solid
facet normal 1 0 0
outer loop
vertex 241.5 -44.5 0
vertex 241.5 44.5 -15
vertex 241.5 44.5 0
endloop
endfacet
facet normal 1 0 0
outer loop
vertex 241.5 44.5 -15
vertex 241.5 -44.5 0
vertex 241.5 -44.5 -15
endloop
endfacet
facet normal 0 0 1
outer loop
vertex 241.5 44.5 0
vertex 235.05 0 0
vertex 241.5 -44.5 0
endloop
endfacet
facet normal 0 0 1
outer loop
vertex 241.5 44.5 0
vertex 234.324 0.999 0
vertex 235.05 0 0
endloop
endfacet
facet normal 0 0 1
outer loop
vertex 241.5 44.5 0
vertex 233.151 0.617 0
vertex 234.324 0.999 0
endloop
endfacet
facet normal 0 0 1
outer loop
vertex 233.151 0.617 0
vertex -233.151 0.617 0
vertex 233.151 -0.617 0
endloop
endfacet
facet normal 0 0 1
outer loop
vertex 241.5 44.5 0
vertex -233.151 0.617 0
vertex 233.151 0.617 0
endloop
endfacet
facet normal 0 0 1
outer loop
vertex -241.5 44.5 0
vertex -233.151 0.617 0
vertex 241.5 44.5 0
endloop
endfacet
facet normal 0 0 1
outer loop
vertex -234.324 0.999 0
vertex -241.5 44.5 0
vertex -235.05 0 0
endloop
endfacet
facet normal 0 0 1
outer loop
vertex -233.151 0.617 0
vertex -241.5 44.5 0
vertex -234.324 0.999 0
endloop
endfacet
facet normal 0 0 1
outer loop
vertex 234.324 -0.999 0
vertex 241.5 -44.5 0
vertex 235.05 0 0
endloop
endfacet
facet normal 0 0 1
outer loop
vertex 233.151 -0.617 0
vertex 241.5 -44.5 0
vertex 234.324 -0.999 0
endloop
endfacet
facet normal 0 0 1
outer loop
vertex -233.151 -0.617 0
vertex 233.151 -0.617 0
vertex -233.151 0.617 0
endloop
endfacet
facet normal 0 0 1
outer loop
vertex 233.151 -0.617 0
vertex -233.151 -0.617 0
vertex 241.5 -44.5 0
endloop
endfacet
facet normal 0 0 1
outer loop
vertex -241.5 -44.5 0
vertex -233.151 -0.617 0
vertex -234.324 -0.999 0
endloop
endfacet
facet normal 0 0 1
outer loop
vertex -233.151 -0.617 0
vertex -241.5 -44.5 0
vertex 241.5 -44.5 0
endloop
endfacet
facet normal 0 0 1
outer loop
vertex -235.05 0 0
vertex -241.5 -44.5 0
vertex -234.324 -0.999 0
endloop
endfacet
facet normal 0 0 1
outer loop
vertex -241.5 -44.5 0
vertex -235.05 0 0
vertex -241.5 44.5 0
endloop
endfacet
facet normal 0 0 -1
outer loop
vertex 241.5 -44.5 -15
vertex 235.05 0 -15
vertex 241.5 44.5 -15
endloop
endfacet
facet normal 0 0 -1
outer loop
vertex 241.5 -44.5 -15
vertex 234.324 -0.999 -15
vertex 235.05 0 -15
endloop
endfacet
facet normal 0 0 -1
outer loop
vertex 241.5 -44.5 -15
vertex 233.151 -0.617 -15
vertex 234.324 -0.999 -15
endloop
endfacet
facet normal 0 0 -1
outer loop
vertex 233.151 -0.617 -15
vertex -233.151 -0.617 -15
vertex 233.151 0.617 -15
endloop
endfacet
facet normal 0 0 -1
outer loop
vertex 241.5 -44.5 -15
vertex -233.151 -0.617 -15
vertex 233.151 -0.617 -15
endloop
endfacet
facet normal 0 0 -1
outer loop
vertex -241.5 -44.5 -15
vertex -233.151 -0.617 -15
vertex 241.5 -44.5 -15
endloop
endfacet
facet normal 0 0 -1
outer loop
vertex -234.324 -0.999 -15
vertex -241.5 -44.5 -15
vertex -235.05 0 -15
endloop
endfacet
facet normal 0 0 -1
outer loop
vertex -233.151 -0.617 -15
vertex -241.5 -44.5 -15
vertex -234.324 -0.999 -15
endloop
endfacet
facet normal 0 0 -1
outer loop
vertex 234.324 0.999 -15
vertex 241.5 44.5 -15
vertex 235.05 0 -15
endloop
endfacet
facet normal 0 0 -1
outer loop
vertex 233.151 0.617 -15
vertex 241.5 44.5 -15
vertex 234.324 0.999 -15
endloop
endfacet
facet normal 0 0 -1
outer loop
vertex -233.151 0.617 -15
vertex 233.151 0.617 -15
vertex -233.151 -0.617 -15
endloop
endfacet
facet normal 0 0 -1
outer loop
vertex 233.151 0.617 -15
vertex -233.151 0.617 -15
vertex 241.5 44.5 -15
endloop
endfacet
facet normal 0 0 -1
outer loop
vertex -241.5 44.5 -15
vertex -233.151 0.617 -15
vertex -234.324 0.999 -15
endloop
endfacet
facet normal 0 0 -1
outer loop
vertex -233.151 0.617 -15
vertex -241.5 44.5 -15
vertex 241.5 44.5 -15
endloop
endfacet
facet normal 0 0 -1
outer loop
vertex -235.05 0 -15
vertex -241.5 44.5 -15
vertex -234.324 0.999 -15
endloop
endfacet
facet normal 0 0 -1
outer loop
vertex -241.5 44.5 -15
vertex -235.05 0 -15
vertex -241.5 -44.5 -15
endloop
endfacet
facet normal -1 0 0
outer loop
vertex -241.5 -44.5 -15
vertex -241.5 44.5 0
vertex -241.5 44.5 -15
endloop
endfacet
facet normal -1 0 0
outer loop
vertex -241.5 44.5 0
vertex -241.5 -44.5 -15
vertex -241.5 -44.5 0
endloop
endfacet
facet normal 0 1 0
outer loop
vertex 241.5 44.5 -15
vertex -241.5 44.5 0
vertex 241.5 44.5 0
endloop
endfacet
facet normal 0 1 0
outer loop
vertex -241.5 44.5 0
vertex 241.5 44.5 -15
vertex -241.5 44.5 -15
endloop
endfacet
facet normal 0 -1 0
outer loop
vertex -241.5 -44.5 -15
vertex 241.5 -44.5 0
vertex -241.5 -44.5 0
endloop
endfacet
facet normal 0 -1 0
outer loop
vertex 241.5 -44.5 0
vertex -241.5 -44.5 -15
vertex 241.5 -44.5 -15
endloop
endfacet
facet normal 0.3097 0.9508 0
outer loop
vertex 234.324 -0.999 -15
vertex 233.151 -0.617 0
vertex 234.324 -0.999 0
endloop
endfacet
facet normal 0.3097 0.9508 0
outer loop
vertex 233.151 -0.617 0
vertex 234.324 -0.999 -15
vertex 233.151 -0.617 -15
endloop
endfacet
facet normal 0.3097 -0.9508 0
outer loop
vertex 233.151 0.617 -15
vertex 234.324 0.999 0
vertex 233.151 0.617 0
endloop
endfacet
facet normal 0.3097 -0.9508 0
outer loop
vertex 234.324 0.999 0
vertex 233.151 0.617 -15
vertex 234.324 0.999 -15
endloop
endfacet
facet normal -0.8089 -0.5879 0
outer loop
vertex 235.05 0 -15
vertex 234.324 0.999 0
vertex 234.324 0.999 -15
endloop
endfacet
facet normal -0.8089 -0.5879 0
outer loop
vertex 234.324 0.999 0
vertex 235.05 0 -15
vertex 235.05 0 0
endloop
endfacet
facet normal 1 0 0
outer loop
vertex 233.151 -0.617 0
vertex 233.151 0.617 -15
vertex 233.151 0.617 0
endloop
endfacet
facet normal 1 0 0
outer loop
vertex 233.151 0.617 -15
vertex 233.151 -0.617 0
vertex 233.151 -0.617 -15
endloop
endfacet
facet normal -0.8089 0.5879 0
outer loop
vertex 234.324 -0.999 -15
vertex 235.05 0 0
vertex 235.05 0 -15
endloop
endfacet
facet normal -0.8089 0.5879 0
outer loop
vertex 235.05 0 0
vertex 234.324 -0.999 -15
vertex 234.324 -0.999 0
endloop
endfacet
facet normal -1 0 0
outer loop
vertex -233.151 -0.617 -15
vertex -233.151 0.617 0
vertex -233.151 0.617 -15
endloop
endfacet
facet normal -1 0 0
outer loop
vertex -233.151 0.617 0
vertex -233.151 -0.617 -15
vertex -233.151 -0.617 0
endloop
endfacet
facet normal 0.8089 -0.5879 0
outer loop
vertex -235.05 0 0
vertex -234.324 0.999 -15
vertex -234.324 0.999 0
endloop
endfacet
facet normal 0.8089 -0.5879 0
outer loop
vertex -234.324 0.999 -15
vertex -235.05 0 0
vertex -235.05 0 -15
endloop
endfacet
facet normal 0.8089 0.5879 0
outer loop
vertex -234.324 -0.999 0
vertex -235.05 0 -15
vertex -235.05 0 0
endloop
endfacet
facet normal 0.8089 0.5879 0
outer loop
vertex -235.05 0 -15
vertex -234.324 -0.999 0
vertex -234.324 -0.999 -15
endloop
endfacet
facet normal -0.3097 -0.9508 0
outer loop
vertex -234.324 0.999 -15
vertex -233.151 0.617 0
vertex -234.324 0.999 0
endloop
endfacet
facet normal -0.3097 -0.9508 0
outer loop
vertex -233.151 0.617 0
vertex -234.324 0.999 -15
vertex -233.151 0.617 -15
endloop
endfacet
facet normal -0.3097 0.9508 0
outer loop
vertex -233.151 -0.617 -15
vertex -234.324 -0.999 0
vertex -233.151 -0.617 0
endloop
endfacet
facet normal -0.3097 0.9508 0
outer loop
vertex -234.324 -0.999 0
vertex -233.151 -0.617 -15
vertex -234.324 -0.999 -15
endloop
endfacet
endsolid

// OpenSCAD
// file: variabile.scad
//parametrii generali
latime_exterioara_dulap = 500; //mm
adancime_exterioara_dulap = 500; //mm
inaltime_utila_segment_dulap = 90; //inaltimea utila minima
numar_segmente_dulap = 4;

//definitii legate de materiale
grosime_exterior_dulap = 15;
grosime_fund_sertar = 15;
grosime_laterale_sertar = 15;

//gauri de surub si cap surub
diametru_gauri_holzsurub = 2.1;
diametru_gauri_surub = 2.1; //doar pt ghidare, dau gaura cu 8mm lemn
diametru_cap_surub = 20;
// calculez adancimea din datele surubului
lungime_filet_surub = 20; //mm
lungime_filet_ramas = 10; //mm, cat ramane pentru piulita
adancime_cap_surub = (grosime_laterale_sertar - (lungime_filet_surub-lungime_filet_ramas)/2);
echo();
echo("adancime_cap_surub:", adancime_cap_surub);
echo();

// dimensiuni slot-uri
grosime_slot_sertar = grosime_fund_sertar + 1; //1mm toleranta
adancime_slot_sertar = 6;

/*
    variabile specifice dulapului exterior
*/
//variabile specifice lateralei de dulap
inaltime_initiala = 1;// primul slot pleaca putin deasupra fundului
inaltime_segment_dulap = inaltime_utila_segment_dulap + grosime_slot_sertar;
inaltime_laterala = 2*grosime_exterior_dulap + inaltime_initiala + inaltime_segment_dulap*numar_segmente_dulap;
echo();
echo("inaltime_segment_dulap: ",inaltime_segment_dulap);
echo("inaltime_laterala: ",inaltime_laterala);
echo();

numar_suruburi_capace_sus_jos = 5;
offset_suruburi_capace_sus_jos = 30; // de la marginea placii la centrul primei gauri
//distanta_fata_de_centru_gauri_laterale = 100;
distanta_fata_de_centru_gauri_laterale =adancime_exterioara_dulap/3;
pozitie_gauri_de_sus = 2; // sloturi
pozitie_gauri_de_jos = 1; // sloturi


//variabile specifice capacelor de sus si jos
adancime_capac_sus_jos = adancime_exterioara_dulap; //mm
latime_capac_sus_jos = latime_exterioara_dulap - 2*grosime_exterior_dulap;
numar_suruburi_capac_fund = 5; // in cate suruburi fixez fundul
offset_suruburi_fund = 30; // de la marginea bucatii la centrul primei gauri
distanta_suruburi_fixare_module_sus_jos = adancime_capac_sus_jos/3; //mm

gauri_fixare_picioare = true;
distanta_gauri_picioare_centru_centru = 50;
latime_suport_picioare = 80;
offset_fata = 30; // de la marginea din fata 
offset_laterala = 30; // de la peretele lateral


//variabile specifice fundului de dulap
distanta_suruburi_fixare_fund = 200; //mm or undef if not required
adancime_fund = inaltime_laterala - 2*grosime_exterior_dulap;
latime_fund = latime_exterioara_dulap - 2*grosime_exterior_dulap;




/*
    variabile specifice sertarelor
*/
// trebui ajustata in functie de dulap si grosimile reale
// la placajul meu,se mai aduna 2mm 
toleranta_fund_sertar_laterale = 0;//mm - se imparte la 2 pt cele 2 margini, vezi pt ce corp le faci
toleranta_adancime_fund_sertar = 2;//mm - sertarul e putin mai scurt
toleranta_pereti_sertar = 1; // de fiecare parte, intre dulap si sertar, muta centrul gaurilor spre centrul fundului de sertar
toleranta_inaltime_sertar = 1;

gaura_maner = 1;
diametru_gaura_maner=4.1;
/*
adancime_maner_fund_sertar = 20;// cat iese manerul in afara
latime_maner_fund_sertar = 80;
raza_rotunjire_maner_fund_sertar=5;
*/
//gauri folosite la ansamblarea sertarului, auxiliare
diametru_gauri_aliniere_margini_sertar=3;
foloseste_pini_aliniere_laterala_lunga = true;
numar_gauri_aliniere_laterala_lunga=3;
offset_gauri_aliniere_laterala_lunga=40;
foloseste_pini_aliniere_laterala_scurta = true;
numar_gauri_aliniere_laterala_scurta=3;
offset_gauri_aliniere_laterala_scurta=30;

// dimensiunile fundului de sertar
adancime_fund_sertar = adancime_capac_sus_jos-grosime_exterior_dulap-toleranta_adancime_fund_sertar;
// e echivalenta cu latimea capacelor sus/jos + adancime sloturi - toleranta in lateral
latime_fund_sertar = (latime_exterioara_dulap - 2*grosime_exterior_dulap) + 2*adancime_slot_sertar-toleranta_fund_sertar_laterale;
echo("adancime_fund_sertar:",adancime_fund_sertar);
echo("latime_fund_sertar:", latime_fund_sertar);

// parametrii pentru gaurile ce fixeaza laterala lunga in fundul de sertar
gauri_fixare_laterala_lunga_sertar = true; // pune false ca sa dispara gaurile
offset_gauri_laterala_lunga_fund_sertar = 50;// de la margini, locatia primei gauri
numar_gauri_laterala_lunga_fund_sertar = 3; // numar impar neaparat, >1
assert(numar_gauri_laterala_lunga_fund_sertar>1, "numar_gauri_laterala_lunga_fund_sertar trebuie sa fie mai mare ca 1");
assert(1==numar_gauri_laterala_lunga_fund_sertar%2,"numar_gauri_laterala_lunga_fund_sertar trebuie sa fie un numar impar");

// parametrii pentru gaurile ce fixeaza laterala scurta in fundul de sertar
gauri_fixare_laterala_scurta_sertar = true; // pune false ca sa dispara
offset_gauri_laterala_scurta_fund_sertar = 50;
numar_gauri_laterala_scurta_fund_sertar = 3;
assert(numar_gauri_laterala_scurta_fund_sertar>1,"numar_gauri_laterala_scurta_fund_sertar trebuie sa fie mai mare ca 1");
assert(1==numar_gauri_laterala_scurta_fund_sertar%2,"numar_gauri_laterala_scurta_fund_sertar trebuie sa fie numar impar");

// parametrii pentru laterala lunga de sertar
numar_gauri_fixare_laterala_lunga_in_scurta = 1; // 1 sau numar impar
offset_gauri_laterala_lunga_in_scurta = 0;
assert(1==numar_gauri_fixare_laterala_lunga_in_scurta%2, "numar_gauri_fixare_laterala_lunga_in_scurta trebuie sa fie numar impar");

// functii auxiliare
/*
    formeaza obiectul ce contine capul de surub si surubul
    obiectul se scade din placa de baza
*/
module gauraCompusaLaterala() {
    union() {
        translate([0,0,-adancime_cap_surub/2])
            cylinder(h=adancime_cap_surub, r=diametru_cap_surub/2, center=true);
        translate([0,0,-grosime_exterior_dulap/2])
            cylinder(h=grosime_exterior_dulap , r=diametru_gauri_surub/2,center=true);
    }
}
// main file
include <variabile.scad>

module obiectDeBaza() {
    
    lungimeFundSertar = adancime_fund_sertar;
    inaltimeFundSertar = inaltime_utila_segment_dulap - toleranta_inaltime_sertar;
    echo("---");
    echo("LATERALA LUNGA SERTAR");
    echo("lungime fund sertar", lungimeFundSertar);
    echo("inaltime fund sertar", inaltimeFundSertar);
    echo("");
    translate([0,0, -grosime_laterale_sertar/2])
        cube([lungimeFundSertar, inaltimeFundSertar ,grosime_laterale_sertar], true);
}


module gauriInLaterala() {
    if(1==numar_gauri_fixare_laterala_lunga_in_scurta) {
        translate([adancime_fund_sertar/2-grosime_laterale_sertar/2,0,-grosime_laterale_sertar/2])
            cylinder(h=grosime_laterale_sertar, r=diametru_gauri_holzsurub/2, center=true);
    } else {
    }
}


difference() {
    obiectDeBaza();
    gauriInLaterala();
    mirror([1,0,0]) gauriInLaterala();
}
